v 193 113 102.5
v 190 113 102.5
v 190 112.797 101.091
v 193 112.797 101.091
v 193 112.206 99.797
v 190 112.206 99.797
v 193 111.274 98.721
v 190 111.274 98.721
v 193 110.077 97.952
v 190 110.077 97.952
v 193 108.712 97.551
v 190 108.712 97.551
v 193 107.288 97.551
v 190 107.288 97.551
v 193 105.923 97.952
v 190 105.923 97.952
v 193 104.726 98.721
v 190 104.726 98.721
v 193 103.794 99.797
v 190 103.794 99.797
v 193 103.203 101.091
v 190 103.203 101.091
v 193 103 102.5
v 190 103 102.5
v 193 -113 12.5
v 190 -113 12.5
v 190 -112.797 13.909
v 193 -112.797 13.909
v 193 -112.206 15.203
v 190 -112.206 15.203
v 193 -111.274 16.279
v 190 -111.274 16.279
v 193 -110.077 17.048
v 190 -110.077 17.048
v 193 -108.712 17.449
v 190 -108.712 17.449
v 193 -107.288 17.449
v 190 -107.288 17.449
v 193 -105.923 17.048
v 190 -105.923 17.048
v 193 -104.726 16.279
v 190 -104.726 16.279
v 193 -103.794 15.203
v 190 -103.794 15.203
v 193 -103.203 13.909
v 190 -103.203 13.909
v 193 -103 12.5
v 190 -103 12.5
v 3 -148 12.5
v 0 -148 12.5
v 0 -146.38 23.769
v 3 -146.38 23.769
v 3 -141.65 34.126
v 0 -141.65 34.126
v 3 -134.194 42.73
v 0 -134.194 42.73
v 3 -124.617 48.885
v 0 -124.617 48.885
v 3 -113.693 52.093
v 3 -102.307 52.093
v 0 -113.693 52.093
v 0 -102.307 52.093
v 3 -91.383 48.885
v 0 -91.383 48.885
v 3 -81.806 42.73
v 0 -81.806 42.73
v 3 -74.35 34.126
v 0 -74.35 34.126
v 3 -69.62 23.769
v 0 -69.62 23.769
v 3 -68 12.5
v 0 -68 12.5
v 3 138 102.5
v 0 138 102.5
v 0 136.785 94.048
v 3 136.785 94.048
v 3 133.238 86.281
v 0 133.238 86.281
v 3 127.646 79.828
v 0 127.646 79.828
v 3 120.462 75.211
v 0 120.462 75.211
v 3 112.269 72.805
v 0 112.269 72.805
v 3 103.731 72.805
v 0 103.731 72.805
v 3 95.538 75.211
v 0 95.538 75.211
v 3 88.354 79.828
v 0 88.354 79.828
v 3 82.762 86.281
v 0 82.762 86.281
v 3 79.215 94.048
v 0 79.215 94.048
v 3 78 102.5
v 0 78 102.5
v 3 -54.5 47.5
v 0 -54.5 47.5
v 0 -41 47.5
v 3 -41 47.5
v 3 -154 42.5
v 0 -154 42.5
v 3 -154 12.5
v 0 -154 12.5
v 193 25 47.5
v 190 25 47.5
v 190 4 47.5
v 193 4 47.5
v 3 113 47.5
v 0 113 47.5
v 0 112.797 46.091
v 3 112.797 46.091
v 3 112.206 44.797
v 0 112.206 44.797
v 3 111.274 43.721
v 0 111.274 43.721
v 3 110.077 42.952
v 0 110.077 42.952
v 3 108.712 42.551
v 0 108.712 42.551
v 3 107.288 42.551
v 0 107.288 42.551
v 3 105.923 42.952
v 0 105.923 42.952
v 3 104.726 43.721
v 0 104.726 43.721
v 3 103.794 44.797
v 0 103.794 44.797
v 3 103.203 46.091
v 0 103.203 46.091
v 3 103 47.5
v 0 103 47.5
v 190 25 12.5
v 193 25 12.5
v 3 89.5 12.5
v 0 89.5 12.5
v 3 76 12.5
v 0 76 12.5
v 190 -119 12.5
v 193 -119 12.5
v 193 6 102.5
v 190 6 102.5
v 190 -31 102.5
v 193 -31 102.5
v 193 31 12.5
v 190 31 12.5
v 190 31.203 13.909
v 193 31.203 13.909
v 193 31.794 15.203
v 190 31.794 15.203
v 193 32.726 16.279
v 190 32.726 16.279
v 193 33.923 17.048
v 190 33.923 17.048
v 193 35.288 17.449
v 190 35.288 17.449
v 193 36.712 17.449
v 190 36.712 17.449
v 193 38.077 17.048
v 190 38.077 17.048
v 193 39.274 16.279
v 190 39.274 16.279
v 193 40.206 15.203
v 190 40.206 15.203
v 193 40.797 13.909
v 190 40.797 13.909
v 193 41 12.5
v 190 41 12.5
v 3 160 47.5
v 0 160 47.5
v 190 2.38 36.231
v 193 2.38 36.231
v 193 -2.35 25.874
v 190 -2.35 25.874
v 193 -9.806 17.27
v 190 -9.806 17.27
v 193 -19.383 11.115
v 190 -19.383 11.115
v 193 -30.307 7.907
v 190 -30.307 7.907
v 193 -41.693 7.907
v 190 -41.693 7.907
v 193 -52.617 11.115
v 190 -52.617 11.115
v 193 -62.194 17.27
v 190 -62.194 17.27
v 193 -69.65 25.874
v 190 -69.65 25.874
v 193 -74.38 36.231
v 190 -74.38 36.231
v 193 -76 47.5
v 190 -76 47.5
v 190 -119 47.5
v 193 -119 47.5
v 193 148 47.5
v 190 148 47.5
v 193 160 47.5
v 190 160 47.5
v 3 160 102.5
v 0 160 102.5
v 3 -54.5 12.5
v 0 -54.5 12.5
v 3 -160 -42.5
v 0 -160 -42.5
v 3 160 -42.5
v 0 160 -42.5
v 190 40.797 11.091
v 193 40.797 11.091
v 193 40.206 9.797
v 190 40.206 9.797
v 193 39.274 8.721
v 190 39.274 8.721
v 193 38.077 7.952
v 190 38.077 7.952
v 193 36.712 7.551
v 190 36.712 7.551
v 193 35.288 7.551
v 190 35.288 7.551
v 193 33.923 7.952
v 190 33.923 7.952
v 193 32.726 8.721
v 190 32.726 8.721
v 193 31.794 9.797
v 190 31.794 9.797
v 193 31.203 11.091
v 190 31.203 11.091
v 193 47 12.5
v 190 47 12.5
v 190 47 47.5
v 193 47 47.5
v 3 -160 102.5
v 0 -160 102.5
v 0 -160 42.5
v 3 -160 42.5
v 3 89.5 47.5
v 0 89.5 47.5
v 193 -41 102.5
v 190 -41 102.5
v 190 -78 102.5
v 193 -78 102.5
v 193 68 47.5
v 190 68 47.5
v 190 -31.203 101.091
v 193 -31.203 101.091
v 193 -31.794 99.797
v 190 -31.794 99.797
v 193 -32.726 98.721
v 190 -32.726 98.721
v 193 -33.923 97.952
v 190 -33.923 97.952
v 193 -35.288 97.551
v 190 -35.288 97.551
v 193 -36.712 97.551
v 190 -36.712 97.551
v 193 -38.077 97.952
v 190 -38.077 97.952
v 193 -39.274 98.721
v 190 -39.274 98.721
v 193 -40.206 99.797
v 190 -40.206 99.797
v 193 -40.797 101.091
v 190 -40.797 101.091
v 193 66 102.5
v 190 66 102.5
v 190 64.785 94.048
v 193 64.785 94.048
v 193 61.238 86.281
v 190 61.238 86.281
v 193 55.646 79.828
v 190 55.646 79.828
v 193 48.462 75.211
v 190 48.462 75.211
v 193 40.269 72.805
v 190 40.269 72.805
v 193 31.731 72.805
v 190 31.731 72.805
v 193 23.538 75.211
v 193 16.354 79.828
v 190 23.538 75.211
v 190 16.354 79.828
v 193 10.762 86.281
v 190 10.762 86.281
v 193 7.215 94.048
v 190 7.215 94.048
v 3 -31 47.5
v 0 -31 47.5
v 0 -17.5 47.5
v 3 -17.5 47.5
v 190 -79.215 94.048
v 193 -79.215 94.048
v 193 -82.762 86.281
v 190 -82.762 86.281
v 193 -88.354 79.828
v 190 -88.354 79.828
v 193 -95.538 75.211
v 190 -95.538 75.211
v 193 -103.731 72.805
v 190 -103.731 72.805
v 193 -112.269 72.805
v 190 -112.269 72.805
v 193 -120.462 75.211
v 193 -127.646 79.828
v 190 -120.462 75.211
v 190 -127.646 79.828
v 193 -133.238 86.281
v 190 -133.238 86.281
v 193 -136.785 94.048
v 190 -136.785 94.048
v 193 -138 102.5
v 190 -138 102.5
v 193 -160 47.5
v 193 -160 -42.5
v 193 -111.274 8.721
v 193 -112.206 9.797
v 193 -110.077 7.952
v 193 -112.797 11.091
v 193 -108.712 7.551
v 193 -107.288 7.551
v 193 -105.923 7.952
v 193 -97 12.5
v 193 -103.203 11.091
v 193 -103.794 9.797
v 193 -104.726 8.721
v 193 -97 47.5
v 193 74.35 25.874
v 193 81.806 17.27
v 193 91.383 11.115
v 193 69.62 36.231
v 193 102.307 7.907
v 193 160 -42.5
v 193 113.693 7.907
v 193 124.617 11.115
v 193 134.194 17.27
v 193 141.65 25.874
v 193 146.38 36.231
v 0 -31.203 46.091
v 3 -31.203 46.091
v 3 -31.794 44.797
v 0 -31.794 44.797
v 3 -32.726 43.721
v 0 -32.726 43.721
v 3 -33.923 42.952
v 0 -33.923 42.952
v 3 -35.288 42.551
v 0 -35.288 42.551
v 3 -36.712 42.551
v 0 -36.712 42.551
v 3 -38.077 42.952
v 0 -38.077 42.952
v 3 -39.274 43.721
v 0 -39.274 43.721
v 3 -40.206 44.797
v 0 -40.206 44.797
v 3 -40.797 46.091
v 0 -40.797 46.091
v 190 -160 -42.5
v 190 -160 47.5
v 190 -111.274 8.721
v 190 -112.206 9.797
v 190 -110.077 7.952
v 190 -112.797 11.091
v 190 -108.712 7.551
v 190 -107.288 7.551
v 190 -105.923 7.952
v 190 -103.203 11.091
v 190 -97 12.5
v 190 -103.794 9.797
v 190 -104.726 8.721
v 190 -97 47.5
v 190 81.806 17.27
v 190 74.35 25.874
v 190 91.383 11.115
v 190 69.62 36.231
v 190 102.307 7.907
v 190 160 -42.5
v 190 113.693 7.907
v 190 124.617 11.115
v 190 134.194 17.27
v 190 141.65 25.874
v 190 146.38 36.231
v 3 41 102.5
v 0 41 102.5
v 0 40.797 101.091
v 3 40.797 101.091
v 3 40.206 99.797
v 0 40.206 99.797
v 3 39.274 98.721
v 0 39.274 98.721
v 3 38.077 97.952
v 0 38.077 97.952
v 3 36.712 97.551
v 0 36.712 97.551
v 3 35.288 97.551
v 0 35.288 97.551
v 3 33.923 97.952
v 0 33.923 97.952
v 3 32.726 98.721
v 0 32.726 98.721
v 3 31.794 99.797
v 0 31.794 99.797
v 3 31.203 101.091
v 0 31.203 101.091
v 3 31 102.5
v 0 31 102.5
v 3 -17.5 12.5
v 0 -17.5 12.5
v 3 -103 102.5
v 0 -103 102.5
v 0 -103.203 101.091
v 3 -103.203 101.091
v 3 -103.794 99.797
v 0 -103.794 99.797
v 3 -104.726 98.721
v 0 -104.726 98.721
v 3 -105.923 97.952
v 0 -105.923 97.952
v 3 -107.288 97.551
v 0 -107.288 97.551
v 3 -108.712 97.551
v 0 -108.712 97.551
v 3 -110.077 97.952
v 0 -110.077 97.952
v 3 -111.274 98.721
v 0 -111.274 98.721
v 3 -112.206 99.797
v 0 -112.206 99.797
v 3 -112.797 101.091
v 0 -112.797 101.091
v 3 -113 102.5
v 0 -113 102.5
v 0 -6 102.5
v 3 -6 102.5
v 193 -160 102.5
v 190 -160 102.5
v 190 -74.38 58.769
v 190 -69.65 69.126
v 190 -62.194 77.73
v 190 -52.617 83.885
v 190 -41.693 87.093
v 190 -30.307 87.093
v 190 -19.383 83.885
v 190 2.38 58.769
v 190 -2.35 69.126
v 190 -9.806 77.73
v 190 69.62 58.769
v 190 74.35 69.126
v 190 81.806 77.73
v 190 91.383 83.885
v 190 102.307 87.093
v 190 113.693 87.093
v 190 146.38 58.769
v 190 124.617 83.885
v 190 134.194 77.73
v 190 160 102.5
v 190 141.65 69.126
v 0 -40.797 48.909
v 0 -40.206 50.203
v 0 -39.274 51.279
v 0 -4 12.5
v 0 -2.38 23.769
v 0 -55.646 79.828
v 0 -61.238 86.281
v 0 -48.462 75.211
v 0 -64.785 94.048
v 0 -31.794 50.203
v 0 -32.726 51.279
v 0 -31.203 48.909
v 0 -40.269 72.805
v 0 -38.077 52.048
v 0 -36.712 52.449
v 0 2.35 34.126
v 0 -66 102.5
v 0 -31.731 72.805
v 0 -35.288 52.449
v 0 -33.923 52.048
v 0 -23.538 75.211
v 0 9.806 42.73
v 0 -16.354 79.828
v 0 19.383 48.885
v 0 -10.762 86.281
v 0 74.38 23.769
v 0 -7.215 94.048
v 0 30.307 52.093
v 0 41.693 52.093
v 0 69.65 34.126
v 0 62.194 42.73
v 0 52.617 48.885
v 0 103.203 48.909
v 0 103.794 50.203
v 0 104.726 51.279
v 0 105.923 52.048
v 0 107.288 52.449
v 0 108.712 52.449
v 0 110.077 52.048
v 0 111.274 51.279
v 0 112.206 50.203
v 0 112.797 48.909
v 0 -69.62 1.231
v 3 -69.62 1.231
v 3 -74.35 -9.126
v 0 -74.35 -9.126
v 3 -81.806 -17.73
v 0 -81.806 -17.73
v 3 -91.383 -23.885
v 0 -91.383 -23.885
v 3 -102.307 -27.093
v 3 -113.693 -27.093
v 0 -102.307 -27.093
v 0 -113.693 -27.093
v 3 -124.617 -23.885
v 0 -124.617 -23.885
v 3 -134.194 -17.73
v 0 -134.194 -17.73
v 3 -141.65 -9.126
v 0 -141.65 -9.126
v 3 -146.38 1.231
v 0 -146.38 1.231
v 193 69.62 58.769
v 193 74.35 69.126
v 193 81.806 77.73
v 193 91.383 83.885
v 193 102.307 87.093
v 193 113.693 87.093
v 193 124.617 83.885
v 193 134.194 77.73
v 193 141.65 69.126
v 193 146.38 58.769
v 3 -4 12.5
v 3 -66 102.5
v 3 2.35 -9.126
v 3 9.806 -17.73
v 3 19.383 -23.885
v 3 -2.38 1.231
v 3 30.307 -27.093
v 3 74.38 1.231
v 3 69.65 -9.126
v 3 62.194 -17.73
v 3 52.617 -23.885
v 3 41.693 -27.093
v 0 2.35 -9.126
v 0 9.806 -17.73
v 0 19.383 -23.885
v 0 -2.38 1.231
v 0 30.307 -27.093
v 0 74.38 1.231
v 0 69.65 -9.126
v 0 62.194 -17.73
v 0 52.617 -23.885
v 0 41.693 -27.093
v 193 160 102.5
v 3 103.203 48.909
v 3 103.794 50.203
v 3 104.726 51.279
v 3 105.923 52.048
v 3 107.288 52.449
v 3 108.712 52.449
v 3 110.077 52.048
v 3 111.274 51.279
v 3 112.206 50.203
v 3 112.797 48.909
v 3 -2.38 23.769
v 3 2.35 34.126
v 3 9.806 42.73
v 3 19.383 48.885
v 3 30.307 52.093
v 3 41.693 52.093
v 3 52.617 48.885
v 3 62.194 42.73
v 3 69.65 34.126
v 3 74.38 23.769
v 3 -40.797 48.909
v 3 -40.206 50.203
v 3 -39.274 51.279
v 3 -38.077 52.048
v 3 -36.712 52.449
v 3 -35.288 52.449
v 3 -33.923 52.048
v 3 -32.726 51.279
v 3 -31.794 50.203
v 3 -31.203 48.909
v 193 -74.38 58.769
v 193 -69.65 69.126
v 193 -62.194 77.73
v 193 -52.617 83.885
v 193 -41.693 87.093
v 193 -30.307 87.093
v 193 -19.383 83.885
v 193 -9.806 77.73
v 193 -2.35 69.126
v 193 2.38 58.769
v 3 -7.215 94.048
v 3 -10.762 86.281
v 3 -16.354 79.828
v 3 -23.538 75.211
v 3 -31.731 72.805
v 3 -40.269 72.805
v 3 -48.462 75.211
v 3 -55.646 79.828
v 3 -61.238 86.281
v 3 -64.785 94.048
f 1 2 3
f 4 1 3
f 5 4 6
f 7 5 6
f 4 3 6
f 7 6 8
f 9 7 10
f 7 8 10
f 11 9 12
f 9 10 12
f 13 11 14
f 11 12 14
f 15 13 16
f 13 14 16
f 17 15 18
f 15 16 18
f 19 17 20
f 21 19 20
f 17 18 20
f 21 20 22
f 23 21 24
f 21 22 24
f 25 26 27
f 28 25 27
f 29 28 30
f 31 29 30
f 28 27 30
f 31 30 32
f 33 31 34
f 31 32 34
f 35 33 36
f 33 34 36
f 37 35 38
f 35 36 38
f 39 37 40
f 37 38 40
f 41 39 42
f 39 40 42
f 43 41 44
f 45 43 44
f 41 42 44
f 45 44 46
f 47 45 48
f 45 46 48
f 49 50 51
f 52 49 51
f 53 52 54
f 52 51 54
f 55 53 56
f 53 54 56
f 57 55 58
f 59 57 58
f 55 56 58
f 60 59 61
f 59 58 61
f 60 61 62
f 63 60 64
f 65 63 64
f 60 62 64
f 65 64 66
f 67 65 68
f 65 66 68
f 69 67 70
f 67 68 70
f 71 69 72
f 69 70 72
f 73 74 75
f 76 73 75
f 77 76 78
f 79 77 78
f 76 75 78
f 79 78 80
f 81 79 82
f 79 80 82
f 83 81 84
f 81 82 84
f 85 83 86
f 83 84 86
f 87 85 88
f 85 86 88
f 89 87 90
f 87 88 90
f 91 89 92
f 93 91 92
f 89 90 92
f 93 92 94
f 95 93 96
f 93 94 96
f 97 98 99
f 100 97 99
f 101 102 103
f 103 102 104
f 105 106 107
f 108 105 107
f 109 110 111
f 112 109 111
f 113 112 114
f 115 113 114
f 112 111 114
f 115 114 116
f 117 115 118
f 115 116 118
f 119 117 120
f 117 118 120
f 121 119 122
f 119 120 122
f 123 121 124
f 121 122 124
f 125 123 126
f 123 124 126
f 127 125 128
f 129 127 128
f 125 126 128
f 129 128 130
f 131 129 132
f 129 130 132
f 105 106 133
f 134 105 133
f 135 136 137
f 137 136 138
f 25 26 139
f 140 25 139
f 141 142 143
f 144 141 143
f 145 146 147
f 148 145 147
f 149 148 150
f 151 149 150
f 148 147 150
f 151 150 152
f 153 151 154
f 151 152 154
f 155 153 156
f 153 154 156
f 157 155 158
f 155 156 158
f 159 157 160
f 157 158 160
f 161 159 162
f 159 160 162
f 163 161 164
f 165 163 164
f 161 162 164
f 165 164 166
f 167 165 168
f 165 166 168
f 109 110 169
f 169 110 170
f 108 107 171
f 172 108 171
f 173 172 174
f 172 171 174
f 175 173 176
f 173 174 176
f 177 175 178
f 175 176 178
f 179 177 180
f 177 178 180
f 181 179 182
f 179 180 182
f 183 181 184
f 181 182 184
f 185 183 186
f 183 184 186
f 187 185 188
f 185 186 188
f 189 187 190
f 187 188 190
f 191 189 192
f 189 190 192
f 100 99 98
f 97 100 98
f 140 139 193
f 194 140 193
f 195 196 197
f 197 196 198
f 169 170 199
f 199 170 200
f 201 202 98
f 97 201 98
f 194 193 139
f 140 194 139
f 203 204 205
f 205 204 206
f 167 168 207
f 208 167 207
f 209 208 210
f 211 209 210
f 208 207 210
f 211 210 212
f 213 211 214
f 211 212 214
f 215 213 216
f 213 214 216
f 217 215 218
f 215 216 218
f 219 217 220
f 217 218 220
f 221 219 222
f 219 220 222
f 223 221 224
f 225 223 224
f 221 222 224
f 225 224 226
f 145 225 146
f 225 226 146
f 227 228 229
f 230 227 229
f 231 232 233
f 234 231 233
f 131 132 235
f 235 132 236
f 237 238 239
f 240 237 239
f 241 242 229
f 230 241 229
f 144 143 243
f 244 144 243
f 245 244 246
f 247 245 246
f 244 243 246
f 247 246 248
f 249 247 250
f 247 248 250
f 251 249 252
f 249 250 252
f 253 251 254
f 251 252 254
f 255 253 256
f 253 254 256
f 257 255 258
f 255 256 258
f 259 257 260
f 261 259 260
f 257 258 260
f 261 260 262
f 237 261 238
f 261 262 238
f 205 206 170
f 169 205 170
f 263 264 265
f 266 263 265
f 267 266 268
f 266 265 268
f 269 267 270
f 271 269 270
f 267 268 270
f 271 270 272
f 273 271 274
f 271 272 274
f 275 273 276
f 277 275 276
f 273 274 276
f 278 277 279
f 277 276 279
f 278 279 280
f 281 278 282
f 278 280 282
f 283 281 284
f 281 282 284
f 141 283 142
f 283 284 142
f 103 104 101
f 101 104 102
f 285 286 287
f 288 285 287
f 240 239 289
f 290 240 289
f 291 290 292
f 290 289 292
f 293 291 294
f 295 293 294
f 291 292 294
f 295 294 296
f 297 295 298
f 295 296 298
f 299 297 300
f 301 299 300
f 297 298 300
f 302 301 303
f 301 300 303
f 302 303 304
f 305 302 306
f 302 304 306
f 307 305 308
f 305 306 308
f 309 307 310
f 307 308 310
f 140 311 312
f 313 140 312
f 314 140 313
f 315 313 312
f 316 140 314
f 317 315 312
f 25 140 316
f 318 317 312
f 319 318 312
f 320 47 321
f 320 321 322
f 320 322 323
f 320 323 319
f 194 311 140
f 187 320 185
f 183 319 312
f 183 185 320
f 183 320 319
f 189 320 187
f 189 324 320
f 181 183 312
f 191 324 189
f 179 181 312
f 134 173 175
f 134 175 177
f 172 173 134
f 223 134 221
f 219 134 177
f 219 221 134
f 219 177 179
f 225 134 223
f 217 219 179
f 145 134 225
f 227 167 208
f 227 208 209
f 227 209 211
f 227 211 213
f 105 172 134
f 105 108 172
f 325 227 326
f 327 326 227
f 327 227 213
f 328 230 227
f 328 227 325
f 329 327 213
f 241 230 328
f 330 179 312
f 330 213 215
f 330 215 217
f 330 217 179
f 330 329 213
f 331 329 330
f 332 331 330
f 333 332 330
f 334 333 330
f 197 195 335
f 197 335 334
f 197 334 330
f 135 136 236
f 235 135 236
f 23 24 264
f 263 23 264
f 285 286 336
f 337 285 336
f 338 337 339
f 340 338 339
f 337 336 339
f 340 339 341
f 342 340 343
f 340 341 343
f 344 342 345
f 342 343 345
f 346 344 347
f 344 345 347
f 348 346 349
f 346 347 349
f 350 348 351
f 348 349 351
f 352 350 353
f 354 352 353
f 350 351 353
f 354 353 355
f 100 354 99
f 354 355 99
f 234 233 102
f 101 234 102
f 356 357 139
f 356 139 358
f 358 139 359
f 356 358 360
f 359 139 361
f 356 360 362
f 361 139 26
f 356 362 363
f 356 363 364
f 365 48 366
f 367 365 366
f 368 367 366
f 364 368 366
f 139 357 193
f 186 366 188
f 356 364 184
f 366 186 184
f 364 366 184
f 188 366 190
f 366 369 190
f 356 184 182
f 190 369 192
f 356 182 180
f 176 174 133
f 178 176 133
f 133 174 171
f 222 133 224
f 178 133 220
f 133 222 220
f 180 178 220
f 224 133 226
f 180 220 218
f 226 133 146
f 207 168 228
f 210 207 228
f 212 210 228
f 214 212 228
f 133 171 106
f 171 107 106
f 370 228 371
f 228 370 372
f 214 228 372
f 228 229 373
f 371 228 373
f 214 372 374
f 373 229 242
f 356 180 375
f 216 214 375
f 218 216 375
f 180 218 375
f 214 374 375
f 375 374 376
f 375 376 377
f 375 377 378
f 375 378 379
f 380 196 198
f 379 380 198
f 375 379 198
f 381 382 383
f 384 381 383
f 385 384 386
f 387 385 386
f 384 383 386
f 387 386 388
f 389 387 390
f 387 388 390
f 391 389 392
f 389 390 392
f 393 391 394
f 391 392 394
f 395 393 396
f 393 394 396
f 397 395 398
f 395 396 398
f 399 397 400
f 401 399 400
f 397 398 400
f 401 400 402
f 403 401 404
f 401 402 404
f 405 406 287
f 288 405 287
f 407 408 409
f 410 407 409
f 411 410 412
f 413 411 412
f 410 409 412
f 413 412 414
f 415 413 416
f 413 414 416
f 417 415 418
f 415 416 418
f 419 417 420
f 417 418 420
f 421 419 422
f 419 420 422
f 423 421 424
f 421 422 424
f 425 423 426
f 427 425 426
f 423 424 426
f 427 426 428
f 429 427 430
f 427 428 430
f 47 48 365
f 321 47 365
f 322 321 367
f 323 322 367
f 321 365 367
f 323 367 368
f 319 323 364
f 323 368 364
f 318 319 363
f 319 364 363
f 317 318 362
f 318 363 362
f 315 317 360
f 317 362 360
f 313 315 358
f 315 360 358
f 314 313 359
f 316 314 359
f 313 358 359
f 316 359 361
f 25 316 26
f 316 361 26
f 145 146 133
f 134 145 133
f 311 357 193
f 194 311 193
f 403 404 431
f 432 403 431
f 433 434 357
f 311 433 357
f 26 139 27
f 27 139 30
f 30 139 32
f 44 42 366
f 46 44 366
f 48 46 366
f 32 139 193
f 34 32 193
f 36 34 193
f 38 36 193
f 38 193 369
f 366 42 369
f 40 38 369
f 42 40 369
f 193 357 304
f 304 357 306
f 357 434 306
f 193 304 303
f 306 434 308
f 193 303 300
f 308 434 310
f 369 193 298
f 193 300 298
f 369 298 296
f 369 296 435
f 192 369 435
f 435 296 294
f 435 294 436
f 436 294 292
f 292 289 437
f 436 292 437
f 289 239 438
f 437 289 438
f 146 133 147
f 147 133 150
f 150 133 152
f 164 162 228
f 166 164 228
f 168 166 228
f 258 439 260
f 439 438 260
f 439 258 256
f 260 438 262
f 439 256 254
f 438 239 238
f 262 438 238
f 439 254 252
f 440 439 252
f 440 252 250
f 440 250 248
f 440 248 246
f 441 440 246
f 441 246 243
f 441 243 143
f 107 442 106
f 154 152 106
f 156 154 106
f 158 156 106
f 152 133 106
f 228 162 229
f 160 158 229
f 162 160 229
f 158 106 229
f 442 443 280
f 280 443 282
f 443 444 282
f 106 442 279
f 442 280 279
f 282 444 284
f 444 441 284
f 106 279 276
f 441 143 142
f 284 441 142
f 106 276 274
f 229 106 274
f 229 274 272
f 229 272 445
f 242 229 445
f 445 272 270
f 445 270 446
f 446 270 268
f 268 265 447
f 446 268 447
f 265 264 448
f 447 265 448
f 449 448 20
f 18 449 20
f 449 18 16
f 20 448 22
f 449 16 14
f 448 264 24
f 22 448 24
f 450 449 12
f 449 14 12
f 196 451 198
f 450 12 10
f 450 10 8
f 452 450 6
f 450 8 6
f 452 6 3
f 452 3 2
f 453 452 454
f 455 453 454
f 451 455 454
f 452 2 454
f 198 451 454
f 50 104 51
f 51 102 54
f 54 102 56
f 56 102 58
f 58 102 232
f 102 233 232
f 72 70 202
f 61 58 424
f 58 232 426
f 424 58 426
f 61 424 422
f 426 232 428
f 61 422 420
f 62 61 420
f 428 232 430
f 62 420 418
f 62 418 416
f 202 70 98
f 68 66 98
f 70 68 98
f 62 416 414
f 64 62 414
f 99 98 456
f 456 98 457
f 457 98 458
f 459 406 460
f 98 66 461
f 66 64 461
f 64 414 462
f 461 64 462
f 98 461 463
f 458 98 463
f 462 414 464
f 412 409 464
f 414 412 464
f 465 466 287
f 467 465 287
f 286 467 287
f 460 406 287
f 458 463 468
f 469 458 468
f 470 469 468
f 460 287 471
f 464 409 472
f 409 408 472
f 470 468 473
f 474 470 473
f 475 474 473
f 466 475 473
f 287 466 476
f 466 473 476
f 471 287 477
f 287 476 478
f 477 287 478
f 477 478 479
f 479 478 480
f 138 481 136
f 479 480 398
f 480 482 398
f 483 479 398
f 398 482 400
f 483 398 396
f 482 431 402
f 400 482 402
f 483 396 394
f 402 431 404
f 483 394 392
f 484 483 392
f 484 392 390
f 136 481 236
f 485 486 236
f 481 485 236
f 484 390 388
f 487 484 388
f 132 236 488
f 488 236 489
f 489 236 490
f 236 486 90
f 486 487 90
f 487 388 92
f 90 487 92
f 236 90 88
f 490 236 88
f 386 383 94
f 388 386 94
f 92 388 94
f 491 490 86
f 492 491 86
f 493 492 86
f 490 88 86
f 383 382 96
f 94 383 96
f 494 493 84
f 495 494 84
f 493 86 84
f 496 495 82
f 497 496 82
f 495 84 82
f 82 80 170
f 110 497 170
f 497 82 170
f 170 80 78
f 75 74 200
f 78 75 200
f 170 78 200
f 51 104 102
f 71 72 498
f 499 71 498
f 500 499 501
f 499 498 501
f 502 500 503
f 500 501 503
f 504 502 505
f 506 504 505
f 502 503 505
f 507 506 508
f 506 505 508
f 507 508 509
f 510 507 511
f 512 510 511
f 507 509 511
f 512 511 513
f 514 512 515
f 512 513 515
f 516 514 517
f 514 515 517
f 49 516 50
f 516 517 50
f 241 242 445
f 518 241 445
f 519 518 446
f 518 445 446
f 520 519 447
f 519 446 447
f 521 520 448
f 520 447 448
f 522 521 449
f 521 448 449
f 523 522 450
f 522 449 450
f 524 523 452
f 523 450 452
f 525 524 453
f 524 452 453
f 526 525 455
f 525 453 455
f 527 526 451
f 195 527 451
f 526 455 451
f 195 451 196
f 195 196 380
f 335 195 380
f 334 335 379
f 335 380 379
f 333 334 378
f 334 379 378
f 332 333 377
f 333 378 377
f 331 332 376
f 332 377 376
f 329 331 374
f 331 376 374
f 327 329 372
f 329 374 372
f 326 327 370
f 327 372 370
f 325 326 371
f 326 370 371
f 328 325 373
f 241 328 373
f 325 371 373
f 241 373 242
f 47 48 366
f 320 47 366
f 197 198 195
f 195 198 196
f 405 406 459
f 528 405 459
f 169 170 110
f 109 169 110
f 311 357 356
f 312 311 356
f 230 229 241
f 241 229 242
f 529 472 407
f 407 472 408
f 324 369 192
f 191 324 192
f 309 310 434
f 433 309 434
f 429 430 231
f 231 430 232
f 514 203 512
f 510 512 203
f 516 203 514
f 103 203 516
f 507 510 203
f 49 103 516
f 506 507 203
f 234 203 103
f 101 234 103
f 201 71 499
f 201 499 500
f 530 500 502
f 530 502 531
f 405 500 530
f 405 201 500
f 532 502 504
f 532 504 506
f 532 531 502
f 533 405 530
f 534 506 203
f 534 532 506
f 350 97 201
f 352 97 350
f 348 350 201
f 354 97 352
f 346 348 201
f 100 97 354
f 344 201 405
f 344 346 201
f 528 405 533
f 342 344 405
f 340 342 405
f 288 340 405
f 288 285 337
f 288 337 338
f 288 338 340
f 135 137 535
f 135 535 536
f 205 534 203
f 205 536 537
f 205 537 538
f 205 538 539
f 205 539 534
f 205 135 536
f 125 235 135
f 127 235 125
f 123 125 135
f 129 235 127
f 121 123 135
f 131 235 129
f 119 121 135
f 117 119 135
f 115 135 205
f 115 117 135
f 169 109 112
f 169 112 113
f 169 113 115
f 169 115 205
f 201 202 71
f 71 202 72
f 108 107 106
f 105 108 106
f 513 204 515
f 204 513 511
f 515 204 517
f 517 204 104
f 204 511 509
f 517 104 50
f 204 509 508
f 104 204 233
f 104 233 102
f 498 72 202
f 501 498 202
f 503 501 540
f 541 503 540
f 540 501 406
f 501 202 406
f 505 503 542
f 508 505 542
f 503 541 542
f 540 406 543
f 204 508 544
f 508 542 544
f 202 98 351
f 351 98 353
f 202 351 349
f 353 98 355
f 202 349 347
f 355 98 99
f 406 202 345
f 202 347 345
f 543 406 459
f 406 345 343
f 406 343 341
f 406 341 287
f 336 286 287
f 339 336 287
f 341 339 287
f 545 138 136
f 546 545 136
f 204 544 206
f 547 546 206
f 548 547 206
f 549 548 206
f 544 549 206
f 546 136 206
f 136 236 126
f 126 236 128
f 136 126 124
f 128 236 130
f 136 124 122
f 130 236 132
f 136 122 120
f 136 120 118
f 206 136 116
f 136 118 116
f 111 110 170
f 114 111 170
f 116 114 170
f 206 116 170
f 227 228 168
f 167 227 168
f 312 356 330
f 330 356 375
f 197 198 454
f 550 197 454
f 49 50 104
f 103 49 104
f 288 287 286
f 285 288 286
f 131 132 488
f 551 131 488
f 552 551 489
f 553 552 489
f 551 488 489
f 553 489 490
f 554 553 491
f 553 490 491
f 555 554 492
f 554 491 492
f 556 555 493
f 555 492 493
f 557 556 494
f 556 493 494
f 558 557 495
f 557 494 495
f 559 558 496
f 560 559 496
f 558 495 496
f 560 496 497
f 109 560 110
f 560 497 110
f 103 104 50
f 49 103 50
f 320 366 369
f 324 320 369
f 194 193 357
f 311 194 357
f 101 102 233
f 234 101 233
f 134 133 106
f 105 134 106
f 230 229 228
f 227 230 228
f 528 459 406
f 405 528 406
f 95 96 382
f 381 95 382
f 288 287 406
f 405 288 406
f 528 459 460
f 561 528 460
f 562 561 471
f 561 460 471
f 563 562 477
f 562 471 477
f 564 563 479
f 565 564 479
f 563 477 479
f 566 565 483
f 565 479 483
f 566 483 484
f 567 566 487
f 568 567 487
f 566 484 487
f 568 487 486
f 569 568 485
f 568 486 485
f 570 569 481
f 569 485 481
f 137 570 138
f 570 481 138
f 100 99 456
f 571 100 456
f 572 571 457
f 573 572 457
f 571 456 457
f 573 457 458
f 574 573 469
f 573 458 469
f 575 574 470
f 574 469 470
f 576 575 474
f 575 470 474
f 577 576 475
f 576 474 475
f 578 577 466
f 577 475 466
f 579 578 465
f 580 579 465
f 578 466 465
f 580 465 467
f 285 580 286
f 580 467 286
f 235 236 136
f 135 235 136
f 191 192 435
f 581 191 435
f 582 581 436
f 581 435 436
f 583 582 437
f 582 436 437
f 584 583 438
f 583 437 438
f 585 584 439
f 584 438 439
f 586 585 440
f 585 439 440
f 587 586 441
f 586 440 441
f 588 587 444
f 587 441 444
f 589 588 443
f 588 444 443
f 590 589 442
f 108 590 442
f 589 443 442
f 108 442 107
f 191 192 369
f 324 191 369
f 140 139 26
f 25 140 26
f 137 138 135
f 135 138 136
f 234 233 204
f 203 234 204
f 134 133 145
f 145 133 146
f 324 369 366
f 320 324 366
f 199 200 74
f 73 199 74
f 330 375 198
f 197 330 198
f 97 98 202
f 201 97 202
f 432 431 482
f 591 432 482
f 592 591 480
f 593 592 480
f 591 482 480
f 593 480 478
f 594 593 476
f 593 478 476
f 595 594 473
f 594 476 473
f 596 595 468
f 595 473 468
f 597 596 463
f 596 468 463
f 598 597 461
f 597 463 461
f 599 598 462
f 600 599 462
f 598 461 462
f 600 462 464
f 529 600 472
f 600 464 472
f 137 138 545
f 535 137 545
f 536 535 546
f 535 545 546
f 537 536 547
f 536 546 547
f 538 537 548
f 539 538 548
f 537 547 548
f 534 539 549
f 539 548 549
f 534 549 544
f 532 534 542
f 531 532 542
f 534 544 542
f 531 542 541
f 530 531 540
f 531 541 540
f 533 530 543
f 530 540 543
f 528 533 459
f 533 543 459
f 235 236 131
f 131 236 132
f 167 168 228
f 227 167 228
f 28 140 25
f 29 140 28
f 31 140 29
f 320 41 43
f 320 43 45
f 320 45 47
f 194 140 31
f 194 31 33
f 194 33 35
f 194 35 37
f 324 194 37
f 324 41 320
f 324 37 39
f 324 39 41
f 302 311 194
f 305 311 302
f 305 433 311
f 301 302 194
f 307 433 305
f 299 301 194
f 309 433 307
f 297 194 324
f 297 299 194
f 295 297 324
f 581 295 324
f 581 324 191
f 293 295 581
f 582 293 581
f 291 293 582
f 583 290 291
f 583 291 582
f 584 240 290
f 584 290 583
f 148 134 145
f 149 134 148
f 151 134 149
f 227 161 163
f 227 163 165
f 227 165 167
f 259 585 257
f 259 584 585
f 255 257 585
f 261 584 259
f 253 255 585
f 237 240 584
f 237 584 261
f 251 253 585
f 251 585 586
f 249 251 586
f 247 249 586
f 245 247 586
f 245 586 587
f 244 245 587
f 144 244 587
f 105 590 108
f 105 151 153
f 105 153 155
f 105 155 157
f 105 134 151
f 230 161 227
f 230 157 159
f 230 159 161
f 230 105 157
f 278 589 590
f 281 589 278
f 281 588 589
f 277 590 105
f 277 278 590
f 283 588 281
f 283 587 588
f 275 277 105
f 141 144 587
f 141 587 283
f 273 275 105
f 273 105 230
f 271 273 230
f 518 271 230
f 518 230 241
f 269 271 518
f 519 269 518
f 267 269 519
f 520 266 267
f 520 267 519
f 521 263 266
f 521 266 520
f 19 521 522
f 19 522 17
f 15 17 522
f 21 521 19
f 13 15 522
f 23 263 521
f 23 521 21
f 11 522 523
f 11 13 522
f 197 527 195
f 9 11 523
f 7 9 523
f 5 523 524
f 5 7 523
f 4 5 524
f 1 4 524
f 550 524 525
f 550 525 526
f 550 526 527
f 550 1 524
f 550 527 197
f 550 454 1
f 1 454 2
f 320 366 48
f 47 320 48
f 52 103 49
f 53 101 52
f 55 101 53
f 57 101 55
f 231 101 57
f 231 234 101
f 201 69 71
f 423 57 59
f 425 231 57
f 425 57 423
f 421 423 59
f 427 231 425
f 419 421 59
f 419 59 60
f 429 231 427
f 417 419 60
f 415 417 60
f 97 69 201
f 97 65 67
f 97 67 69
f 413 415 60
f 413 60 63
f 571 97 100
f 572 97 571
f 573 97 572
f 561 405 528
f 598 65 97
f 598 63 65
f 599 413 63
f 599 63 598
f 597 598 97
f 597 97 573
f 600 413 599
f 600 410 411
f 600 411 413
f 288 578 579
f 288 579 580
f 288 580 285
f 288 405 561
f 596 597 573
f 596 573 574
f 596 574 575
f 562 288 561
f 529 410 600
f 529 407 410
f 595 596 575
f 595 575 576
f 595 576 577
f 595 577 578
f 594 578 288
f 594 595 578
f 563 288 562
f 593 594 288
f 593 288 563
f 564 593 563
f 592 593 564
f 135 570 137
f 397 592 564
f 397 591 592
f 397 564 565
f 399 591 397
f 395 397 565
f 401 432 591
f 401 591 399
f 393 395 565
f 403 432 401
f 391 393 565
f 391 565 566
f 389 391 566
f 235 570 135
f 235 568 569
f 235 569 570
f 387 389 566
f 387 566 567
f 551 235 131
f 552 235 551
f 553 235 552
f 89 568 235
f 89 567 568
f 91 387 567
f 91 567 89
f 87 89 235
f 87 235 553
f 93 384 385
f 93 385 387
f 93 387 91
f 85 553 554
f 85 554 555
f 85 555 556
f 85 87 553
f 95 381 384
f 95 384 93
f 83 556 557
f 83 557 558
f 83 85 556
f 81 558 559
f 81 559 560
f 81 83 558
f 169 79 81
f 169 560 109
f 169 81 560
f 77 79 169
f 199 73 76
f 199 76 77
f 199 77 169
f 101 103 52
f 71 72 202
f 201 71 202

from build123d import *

# Parameters (mm, degrees)
F1_DEPTH = 3
F2_DEPTH = 3
F5_DEPTH = 3
F6_DEPTH = 3


with BuildPart() as f1:
    # F0 (on Right) → F1 (new body)
    with BuildSketch(Plane.YZ):
        with BuildLine():
            Line((-160, -42.5), (160, -42.5))
            Line((160, -42.5), (160, 47.5))
            Line((160, 47.5), (113, 47.5))
            ThreePointArc((113, 47.5), (108, 42.5), (103, 47.5))
            Line((103, 47.5), (89.5, 47.5))
            Line((89.5, 47.5), (89.5, 12.5))
            Line((89.5, 12.5), (76, 12.5))
            ThreePointArc((76, 12.5), (36, -27.5), (-4, 12.5))
            Line((-4, 12.5), (-17.5, 12.5))
            Line((-17.5, 12.5), (-17.5, 47.5))
            Line((-17.5, 47.5), (-31, 47.5))
            ThreePointArc((-31, 47.5), (-36, 42.5), (-41, 47.5))
            Line((-41, 47.5), (-54.5, 47.5))
            Line((-54.5, 47.5), (-54.5, 12.5))
            Line((-54.5, 12.5), (-68, 12.5))
            ThreePointArc((-68, 12.5), (-108, -27.5), (-148, 12.5))
            Line((-148, 12.5), (-154, 12.5))
            Line((-154, 12.5), (-154, 42.5))
            Line((-154, 42.5), (-160, 42.5))
            Line((-160, 42.5), (-160, -42.5))
        make_face()
    extrude(amount=F1_DEPTH)


with BuildPart() as f2:
    # F0 (on Right) → F2 (new body)
    with BuildSketch(Plane.YZ):
        with BuildLine():
            Line((113, 47.5), (160, 47.5))
            Line((160, 47.5), (160, 102.5))
            Line((160, 102.5), (138, 102.5))
            ThreePointArc((138, 102.5), (108, 72.5), (78, 102.5))
            Line((78, 102.5), (41, 102.5))
            ThreePointArc((41, 102.5), (36, 97.5), (31, 102.5))
            Line((31, 102.5), (-6, 102.5))
            ThreePointArc((-6, 102.5), (-36, 72.5), (-66, 102.5))
            Line((-66, 102.5), (-103, 102.5))
            ThreePointArc((-103, 102.5), (-108, 97.5), (-113, 102.5))
            Line((-113, 102.5), (-160, 102.5))
            Line((-160, 102.5), (-160, 42.5))
            Line((-160, 42.5), (-154, 42.5))
            Line((-154, 42.5), (-154, 12.5))
            Line((-154, 12.5), (-148, 12.5))
            ThreePointArc((-148, 12.5), (-108, 52.5), (-68, 12.5))
            Line((-68, 12.5), (-54.5, 12.5))
            Line((-54.5, 12.5), (-54.5, 47.5))
            Line((-54.5, 47.5), (-41, 47.5))
            ThreePointArc((-41, 47.5), (-36, 52.5), (-31, 47.5))
            Line((-31, 47.5), (-17.5, 47.5))
            Line((-17.5, 47.5), (-17.5, 12.5))
            Line((-17.5, 12.5), (-4, 12.5))
            ThreePointArc((-4, 12.5), (36, 52.5), (76, 12.5))
            Line((76, 12.5), (89.5, 12.5))
            Line((89.5, 12.5), (89.5, 47.5))
            Line((89.5, 47.5), (103, 47.5))
            ThreePointArc((103, 47.5), (108, 52.5), (113, 47.5))
        make_face()
    extrude(amount=F2_DEPTH)


with BuildPart() as f5:
    # F4 (on offset) → F5 (new body)
    with BuildSketch(Plane.YZ.offset(190)):
        with BuildLine():
            Line((-159.999996, -42.499997), (160.000004, -42.499997))
            Line((160.000004, -42.499997), (160.000004, 47.500003))
            Line((160.000004, 47.500003), (148.000004, 47.500003))
            ThreePointArc((148.000004, 47.500003), (108.000004, 7.500003), (68.000004, 47.500003))
            Line((68.000004, 47.500003), (47.000004, 47.500003))
            Line((47.000004, 47.500003), (47.000004, 12.500003))
            Line((47.000004, 12.500003), (41.000004, 12.500003))
            ThreePointArc((41.000004, 12.500003), (36.000004, 7.500003), (31.000004, 12.500003))
            Line((31.000004, 12.500003), (25.000004, 12.500003))
            Line((25.000004, 12.500003), (25.000004, 47.500003))
            Line((25.000004, 47.500003), (4.000004, 47.500003))
            ThreePointArc((4.000004, 47.500003), (-35.999996, 7.500003), (-75.999996, 47.500003))
            Line((-75.999996, 47.500003), (-96.999996, 47.500003))
            Line((-96.999996, 47.500003), (-96.999996, 12.500003))
            Line((-96.999996, 12.500003), (-102.999996, 12.500003))
            ThreePointArc((-102.999996, 12.500003), (-107.999996, 7.500003), (-112.999996, 12.500003))
            Line((-112.999996, 12.500003), (-118.999996, 12.500003))
            Line((-118.999996, 12.500003), (-118.999996, 47.500003))
            Line((-118.999996, 47.500003), (-159.999996, 47.500003))
            Line((-159.999996, 47.500003), (-159.999996, -42.499997))
        make_face()
    extrude(amount=F5_DEPTH)


with BuildPart() as f6:
    # F4 (on offset) → F6 (new body)
    with BuildSketch(Plane.YZ.offset(190)):
        with BuildLine():
            Line((148.000004, 47.500003), (160.000004, 47.500003))
            Line((160.000004, 47.500003), (160.000004, 102.500003))
            Line((160.000004, 102.500003), (113.000004, 102.500003))
            ThreePointArc((113.000004, 102.500003), (108.000004, 97.500003), (103.000004, 102.500003))
            Line((103.000004, 102.500003), (66.000004, 102.500003))
            ThreePointArc((66.000004, 102.500003), (36.000004, 72.500003), (6.000004, 102.500003))
            Line((6.000004, 102.500003), (-30.999996, 102.500003))
            ThreePointArc((-30.999996, 102.500003), (-35.999996, 97.500003), (-40.999996, 102.500003))
            Line((-40.999996, 102.500003), (-77.999996, 102.500003))
            ThreePointArc((-77.999996, 102.500003), (-107.999996, 72.500003), (-137.999996, 102.500003))
            Line((-137.999996, 102.500003), (-159.999996, 102.500003))
            Line((-159.999996, 102.500003), (-159.999996, 47.500003))
            Line((-159.999996, 47.500003), (-118.999996, 47.500003))
            Line((-118.999996, 47.500003), (-118.999996, 12.500003))
            Line((-118.999996, 12.500003), (-112.999996, 12.500003))
            ThreePointArc((-112.999996, 12.500003), (-107.999996, 17.500003), (-102.999996, 12.500003))
            Line((-102.999996, 12.500003), (-96.999996, 12.500003))
            Line((-96.999996, 12.500003), (-96.999996, 47.500003))
            Line((-96.999996, 47.500003), (-75.999996, 47.500003))
            ThreePointArc((-75.999996, 47.500003), (-35.999996, 87.500003), (4.000004, 47.500003))
            Line((4.000004, 47.500003), (25.000004, 47.500003))
            Line((25.000004, 47.500003), (25.000004, 12.500003))
            Line((25.000004, 12.500003), (31.000004, 12.500003))
            ThreePointArc((31.000004, 12.500003), (36.000004, 17.500003), (41.000004, 12.500003))
            Line((41.000004, 12.500003), (47.000004, 12.500003))
            Line((47.000004, 12.500003), (47.000004, 47.500003))
            Line((47.000004, 47.500003), (68.000004, 47.500003))
            ThreePointArc((68.000004, 47.500003), (108.000004, 87.500003), (148.000004, 47.500003))
        make_face()
    extrude(amount=F6_DEPTH)


solid = Compound([f1.part, f2.part, f5.part, f6.part])
